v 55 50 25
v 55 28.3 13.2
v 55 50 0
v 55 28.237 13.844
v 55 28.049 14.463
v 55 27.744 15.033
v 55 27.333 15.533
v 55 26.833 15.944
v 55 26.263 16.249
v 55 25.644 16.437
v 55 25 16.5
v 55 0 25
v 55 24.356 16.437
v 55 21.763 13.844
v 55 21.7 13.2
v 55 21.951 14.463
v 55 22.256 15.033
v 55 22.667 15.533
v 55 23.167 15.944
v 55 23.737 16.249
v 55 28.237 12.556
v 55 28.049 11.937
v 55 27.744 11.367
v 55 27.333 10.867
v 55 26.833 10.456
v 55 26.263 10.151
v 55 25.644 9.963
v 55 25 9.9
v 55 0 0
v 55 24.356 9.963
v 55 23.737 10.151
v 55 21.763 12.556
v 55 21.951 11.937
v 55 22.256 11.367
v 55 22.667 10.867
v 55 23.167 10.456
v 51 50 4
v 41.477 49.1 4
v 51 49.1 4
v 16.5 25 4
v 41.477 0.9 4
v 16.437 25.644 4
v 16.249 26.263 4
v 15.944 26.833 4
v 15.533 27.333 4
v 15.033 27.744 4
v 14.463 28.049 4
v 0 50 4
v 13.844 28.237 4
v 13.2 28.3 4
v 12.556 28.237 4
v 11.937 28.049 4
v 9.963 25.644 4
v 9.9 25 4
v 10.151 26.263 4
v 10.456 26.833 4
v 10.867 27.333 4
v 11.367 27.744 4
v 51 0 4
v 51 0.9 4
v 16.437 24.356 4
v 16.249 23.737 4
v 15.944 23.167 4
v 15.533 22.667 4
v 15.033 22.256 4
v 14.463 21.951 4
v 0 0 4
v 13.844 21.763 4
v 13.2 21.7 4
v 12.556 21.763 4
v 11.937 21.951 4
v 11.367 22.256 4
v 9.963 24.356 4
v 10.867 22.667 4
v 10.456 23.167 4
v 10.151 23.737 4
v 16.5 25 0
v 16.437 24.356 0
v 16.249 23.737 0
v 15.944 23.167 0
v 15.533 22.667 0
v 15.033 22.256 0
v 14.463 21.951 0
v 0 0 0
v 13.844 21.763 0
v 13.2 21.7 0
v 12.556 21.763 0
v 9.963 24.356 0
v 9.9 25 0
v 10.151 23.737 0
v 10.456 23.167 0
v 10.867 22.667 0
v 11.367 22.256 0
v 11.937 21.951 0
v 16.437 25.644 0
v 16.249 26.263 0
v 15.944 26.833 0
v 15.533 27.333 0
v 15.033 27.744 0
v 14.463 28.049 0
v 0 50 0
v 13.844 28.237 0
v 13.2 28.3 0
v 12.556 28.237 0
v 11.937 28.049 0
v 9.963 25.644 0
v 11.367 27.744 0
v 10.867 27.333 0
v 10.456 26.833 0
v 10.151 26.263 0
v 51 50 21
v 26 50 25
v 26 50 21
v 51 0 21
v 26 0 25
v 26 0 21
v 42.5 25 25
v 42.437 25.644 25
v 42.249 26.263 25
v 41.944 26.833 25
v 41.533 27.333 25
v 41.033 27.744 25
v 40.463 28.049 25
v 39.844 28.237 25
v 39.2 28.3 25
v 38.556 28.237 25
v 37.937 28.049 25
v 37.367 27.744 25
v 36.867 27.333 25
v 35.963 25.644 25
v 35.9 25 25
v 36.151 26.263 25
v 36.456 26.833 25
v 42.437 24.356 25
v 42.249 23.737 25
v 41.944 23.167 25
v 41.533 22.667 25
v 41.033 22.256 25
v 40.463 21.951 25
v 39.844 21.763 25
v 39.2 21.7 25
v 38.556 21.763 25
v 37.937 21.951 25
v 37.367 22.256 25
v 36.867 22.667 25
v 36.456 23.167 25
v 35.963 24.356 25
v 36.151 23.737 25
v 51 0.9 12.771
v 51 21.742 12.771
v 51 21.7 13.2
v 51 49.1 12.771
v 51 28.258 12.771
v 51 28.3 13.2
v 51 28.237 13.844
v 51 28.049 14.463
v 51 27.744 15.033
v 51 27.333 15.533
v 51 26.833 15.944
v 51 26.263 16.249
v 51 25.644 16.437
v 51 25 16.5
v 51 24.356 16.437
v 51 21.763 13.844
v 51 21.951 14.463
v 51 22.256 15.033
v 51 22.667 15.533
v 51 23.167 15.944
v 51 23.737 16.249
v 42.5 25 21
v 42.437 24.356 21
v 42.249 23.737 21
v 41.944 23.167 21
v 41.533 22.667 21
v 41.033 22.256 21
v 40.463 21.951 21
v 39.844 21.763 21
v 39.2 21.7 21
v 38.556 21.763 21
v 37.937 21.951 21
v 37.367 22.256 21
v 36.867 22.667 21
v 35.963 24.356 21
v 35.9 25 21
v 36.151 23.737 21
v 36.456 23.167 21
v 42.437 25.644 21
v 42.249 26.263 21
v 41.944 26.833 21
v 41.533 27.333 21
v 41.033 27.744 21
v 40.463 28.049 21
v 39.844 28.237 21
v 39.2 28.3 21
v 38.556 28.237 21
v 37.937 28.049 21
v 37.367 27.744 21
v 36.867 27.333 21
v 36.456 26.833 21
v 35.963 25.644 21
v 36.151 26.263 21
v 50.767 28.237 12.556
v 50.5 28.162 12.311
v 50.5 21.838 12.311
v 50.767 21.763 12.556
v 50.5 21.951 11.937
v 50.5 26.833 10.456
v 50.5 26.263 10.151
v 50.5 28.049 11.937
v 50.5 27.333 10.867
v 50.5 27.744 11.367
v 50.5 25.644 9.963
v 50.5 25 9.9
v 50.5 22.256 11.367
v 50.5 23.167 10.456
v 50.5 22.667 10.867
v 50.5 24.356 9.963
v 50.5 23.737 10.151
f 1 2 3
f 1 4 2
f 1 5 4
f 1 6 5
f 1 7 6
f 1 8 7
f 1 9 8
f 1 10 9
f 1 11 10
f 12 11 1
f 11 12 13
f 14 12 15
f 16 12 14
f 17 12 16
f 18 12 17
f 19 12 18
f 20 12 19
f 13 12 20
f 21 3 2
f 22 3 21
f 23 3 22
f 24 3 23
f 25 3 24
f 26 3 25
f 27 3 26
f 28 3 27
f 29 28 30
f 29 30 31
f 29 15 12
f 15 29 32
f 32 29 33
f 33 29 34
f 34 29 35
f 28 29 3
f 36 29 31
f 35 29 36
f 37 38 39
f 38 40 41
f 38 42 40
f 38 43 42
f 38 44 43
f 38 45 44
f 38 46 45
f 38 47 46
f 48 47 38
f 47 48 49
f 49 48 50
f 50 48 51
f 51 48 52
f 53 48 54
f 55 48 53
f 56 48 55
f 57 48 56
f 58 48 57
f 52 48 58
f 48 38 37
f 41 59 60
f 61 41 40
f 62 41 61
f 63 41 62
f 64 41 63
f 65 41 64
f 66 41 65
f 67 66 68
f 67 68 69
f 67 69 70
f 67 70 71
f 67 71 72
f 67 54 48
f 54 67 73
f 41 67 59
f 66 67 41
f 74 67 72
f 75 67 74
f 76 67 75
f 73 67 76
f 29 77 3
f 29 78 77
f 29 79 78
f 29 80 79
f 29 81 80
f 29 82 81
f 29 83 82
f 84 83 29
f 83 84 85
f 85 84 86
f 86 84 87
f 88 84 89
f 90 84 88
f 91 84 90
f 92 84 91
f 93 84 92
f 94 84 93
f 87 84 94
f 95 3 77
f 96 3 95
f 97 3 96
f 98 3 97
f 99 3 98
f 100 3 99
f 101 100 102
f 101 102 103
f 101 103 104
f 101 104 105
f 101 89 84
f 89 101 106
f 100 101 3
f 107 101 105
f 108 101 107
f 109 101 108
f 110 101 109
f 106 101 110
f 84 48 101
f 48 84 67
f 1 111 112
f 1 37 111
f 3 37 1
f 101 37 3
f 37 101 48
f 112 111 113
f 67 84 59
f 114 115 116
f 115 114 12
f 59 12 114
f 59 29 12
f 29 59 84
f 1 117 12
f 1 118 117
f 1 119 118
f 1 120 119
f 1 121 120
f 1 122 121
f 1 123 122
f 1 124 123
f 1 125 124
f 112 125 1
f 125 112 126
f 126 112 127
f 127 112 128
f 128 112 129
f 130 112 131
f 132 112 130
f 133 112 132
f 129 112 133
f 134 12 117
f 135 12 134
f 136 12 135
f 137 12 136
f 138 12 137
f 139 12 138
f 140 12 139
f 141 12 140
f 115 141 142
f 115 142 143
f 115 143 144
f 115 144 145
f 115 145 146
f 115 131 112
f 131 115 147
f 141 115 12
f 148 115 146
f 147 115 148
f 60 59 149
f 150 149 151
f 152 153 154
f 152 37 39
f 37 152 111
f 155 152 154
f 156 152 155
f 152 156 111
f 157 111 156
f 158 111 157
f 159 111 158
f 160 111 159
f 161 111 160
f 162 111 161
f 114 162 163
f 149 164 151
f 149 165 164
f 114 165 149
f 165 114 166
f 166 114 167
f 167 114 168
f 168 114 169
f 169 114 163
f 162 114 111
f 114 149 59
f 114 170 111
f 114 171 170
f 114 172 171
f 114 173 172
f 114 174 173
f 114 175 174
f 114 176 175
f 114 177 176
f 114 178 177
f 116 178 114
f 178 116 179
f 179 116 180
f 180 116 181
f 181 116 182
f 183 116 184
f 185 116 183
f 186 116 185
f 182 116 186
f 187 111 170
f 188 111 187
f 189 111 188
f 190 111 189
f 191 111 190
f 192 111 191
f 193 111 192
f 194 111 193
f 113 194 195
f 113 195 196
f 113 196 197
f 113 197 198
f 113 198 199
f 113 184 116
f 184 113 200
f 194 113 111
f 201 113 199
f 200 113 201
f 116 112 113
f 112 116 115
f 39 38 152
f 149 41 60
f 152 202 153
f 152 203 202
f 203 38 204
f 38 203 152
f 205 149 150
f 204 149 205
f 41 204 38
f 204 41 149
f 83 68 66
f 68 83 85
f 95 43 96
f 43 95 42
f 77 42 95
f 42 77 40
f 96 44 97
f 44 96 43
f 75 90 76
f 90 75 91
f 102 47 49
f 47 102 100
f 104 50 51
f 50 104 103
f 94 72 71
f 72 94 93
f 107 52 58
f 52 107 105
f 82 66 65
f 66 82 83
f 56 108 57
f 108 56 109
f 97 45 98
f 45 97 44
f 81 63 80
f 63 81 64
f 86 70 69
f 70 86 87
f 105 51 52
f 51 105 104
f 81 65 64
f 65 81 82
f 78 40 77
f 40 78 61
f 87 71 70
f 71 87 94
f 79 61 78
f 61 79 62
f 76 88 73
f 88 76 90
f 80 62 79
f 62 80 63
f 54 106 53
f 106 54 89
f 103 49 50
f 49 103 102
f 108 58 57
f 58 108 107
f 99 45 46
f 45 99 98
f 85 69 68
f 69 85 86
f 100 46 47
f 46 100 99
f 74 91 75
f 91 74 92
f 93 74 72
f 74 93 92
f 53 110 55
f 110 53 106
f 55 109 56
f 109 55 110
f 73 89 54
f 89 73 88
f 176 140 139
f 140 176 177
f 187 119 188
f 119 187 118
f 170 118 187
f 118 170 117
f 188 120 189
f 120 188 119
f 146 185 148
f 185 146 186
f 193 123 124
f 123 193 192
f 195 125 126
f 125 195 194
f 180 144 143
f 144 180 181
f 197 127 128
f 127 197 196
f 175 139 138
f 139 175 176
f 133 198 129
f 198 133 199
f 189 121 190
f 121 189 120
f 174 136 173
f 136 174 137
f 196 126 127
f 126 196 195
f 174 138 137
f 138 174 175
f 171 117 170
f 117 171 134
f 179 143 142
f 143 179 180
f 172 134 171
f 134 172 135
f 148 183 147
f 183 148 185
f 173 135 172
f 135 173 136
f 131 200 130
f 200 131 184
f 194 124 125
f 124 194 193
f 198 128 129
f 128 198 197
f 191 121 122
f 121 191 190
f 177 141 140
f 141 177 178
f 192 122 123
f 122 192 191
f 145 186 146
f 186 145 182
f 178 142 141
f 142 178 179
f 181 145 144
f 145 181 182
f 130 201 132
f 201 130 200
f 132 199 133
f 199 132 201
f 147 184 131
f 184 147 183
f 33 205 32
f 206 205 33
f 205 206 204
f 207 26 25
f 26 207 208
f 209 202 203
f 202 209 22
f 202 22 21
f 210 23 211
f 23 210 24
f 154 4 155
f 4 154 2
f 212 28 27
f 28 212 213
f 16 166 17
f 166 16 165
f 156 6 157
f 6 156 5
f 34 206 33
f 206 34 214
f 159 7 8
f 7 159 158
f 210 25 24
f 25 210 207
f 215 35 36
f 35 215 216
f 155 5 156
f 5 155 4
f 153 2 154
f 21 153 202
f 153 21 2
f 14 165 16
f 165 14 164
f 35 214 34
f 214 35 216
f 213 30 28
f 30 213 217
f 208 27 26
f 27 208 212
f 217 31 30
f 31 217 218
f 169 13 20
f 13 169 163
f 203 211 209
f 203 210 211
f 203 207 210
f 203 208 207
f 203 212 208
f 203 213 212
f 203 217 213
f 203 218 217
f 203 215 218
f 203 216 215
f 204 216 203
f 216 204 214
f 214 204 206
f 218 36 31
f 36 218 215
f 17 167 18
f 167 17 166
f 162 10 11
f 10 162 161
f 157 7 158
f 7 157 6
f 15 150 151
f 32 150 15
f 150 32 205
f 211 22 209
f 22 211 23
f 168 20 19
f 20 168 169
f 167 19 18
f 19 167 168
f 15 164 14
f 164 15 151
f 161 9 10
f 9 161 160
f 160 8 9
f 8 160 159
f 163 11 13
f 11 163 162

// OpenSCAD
$fn = 32;

// ----------------------------------------------------------------------
// Z-bracket: 55 x 50 x 25 mm
// ----------------------------------------------------------------------

// --- parameters (mm) ---
foot_len = 55;            // lower foot length, X
top_len = 25;             // upper foot length, X
depth = 50;               // bracket width, Y
step_h = 25;              // overall rise, Z
plate_t = 4;              // plate thickness
hole_d = 6.6;             // clearance for M6
rib_len = 10.5;           // gusset leg
rib_sink = 0.9;           // gusset overlap into the plates

module hole_z(px, py, z0) {
  translate([px, py, z0 - 0.5]) cylinder(h = plate_t + 1, d = hole_d);
}
module hole_x(py, pz) {
  translate([-0.5, py, pz]) rotate([0, 90, 0]) cylinder(h = plate_t + 1, d = hole_d);
}
module gusset(x0) {
  translate([x0, depth - rib_sink, 0])
    rotate([90, 0, 0])
      linear_extrude(height = depth - 2 * rib_sink)
        polygon(points = [[rib_sink, plate_t - rib_sink],
                          [rib_sink, plate_t - rib_sink + rib_len],
                          [-rib_len, plate_t - rib_sink]]);
}

difference() {
  union() {
    cube([foot_len, depth, plate_t]);
    /* web, overlapping the lower foot */
    translate([foot_len - plate_t, 0, 0]) cube([plate_t, depth, step_h]);
    /* upper foot, sunk into the web */
    translate([foot_len - plate_t - top_len, 0, step_h - plate_t]) cube([top_len + plate_t, depth, plate_t]);
    gusset(foot_len - plate_t);
  }
  hole_z(13.2, 25, 0);
  translate([foot_len - plate_t - 11.8, 0, 0]) hole_z(0, 25, step_h - plate_t);
  translate([foot_len - plate_t, 0, 0]) hole_x(25, 13.2);
}
